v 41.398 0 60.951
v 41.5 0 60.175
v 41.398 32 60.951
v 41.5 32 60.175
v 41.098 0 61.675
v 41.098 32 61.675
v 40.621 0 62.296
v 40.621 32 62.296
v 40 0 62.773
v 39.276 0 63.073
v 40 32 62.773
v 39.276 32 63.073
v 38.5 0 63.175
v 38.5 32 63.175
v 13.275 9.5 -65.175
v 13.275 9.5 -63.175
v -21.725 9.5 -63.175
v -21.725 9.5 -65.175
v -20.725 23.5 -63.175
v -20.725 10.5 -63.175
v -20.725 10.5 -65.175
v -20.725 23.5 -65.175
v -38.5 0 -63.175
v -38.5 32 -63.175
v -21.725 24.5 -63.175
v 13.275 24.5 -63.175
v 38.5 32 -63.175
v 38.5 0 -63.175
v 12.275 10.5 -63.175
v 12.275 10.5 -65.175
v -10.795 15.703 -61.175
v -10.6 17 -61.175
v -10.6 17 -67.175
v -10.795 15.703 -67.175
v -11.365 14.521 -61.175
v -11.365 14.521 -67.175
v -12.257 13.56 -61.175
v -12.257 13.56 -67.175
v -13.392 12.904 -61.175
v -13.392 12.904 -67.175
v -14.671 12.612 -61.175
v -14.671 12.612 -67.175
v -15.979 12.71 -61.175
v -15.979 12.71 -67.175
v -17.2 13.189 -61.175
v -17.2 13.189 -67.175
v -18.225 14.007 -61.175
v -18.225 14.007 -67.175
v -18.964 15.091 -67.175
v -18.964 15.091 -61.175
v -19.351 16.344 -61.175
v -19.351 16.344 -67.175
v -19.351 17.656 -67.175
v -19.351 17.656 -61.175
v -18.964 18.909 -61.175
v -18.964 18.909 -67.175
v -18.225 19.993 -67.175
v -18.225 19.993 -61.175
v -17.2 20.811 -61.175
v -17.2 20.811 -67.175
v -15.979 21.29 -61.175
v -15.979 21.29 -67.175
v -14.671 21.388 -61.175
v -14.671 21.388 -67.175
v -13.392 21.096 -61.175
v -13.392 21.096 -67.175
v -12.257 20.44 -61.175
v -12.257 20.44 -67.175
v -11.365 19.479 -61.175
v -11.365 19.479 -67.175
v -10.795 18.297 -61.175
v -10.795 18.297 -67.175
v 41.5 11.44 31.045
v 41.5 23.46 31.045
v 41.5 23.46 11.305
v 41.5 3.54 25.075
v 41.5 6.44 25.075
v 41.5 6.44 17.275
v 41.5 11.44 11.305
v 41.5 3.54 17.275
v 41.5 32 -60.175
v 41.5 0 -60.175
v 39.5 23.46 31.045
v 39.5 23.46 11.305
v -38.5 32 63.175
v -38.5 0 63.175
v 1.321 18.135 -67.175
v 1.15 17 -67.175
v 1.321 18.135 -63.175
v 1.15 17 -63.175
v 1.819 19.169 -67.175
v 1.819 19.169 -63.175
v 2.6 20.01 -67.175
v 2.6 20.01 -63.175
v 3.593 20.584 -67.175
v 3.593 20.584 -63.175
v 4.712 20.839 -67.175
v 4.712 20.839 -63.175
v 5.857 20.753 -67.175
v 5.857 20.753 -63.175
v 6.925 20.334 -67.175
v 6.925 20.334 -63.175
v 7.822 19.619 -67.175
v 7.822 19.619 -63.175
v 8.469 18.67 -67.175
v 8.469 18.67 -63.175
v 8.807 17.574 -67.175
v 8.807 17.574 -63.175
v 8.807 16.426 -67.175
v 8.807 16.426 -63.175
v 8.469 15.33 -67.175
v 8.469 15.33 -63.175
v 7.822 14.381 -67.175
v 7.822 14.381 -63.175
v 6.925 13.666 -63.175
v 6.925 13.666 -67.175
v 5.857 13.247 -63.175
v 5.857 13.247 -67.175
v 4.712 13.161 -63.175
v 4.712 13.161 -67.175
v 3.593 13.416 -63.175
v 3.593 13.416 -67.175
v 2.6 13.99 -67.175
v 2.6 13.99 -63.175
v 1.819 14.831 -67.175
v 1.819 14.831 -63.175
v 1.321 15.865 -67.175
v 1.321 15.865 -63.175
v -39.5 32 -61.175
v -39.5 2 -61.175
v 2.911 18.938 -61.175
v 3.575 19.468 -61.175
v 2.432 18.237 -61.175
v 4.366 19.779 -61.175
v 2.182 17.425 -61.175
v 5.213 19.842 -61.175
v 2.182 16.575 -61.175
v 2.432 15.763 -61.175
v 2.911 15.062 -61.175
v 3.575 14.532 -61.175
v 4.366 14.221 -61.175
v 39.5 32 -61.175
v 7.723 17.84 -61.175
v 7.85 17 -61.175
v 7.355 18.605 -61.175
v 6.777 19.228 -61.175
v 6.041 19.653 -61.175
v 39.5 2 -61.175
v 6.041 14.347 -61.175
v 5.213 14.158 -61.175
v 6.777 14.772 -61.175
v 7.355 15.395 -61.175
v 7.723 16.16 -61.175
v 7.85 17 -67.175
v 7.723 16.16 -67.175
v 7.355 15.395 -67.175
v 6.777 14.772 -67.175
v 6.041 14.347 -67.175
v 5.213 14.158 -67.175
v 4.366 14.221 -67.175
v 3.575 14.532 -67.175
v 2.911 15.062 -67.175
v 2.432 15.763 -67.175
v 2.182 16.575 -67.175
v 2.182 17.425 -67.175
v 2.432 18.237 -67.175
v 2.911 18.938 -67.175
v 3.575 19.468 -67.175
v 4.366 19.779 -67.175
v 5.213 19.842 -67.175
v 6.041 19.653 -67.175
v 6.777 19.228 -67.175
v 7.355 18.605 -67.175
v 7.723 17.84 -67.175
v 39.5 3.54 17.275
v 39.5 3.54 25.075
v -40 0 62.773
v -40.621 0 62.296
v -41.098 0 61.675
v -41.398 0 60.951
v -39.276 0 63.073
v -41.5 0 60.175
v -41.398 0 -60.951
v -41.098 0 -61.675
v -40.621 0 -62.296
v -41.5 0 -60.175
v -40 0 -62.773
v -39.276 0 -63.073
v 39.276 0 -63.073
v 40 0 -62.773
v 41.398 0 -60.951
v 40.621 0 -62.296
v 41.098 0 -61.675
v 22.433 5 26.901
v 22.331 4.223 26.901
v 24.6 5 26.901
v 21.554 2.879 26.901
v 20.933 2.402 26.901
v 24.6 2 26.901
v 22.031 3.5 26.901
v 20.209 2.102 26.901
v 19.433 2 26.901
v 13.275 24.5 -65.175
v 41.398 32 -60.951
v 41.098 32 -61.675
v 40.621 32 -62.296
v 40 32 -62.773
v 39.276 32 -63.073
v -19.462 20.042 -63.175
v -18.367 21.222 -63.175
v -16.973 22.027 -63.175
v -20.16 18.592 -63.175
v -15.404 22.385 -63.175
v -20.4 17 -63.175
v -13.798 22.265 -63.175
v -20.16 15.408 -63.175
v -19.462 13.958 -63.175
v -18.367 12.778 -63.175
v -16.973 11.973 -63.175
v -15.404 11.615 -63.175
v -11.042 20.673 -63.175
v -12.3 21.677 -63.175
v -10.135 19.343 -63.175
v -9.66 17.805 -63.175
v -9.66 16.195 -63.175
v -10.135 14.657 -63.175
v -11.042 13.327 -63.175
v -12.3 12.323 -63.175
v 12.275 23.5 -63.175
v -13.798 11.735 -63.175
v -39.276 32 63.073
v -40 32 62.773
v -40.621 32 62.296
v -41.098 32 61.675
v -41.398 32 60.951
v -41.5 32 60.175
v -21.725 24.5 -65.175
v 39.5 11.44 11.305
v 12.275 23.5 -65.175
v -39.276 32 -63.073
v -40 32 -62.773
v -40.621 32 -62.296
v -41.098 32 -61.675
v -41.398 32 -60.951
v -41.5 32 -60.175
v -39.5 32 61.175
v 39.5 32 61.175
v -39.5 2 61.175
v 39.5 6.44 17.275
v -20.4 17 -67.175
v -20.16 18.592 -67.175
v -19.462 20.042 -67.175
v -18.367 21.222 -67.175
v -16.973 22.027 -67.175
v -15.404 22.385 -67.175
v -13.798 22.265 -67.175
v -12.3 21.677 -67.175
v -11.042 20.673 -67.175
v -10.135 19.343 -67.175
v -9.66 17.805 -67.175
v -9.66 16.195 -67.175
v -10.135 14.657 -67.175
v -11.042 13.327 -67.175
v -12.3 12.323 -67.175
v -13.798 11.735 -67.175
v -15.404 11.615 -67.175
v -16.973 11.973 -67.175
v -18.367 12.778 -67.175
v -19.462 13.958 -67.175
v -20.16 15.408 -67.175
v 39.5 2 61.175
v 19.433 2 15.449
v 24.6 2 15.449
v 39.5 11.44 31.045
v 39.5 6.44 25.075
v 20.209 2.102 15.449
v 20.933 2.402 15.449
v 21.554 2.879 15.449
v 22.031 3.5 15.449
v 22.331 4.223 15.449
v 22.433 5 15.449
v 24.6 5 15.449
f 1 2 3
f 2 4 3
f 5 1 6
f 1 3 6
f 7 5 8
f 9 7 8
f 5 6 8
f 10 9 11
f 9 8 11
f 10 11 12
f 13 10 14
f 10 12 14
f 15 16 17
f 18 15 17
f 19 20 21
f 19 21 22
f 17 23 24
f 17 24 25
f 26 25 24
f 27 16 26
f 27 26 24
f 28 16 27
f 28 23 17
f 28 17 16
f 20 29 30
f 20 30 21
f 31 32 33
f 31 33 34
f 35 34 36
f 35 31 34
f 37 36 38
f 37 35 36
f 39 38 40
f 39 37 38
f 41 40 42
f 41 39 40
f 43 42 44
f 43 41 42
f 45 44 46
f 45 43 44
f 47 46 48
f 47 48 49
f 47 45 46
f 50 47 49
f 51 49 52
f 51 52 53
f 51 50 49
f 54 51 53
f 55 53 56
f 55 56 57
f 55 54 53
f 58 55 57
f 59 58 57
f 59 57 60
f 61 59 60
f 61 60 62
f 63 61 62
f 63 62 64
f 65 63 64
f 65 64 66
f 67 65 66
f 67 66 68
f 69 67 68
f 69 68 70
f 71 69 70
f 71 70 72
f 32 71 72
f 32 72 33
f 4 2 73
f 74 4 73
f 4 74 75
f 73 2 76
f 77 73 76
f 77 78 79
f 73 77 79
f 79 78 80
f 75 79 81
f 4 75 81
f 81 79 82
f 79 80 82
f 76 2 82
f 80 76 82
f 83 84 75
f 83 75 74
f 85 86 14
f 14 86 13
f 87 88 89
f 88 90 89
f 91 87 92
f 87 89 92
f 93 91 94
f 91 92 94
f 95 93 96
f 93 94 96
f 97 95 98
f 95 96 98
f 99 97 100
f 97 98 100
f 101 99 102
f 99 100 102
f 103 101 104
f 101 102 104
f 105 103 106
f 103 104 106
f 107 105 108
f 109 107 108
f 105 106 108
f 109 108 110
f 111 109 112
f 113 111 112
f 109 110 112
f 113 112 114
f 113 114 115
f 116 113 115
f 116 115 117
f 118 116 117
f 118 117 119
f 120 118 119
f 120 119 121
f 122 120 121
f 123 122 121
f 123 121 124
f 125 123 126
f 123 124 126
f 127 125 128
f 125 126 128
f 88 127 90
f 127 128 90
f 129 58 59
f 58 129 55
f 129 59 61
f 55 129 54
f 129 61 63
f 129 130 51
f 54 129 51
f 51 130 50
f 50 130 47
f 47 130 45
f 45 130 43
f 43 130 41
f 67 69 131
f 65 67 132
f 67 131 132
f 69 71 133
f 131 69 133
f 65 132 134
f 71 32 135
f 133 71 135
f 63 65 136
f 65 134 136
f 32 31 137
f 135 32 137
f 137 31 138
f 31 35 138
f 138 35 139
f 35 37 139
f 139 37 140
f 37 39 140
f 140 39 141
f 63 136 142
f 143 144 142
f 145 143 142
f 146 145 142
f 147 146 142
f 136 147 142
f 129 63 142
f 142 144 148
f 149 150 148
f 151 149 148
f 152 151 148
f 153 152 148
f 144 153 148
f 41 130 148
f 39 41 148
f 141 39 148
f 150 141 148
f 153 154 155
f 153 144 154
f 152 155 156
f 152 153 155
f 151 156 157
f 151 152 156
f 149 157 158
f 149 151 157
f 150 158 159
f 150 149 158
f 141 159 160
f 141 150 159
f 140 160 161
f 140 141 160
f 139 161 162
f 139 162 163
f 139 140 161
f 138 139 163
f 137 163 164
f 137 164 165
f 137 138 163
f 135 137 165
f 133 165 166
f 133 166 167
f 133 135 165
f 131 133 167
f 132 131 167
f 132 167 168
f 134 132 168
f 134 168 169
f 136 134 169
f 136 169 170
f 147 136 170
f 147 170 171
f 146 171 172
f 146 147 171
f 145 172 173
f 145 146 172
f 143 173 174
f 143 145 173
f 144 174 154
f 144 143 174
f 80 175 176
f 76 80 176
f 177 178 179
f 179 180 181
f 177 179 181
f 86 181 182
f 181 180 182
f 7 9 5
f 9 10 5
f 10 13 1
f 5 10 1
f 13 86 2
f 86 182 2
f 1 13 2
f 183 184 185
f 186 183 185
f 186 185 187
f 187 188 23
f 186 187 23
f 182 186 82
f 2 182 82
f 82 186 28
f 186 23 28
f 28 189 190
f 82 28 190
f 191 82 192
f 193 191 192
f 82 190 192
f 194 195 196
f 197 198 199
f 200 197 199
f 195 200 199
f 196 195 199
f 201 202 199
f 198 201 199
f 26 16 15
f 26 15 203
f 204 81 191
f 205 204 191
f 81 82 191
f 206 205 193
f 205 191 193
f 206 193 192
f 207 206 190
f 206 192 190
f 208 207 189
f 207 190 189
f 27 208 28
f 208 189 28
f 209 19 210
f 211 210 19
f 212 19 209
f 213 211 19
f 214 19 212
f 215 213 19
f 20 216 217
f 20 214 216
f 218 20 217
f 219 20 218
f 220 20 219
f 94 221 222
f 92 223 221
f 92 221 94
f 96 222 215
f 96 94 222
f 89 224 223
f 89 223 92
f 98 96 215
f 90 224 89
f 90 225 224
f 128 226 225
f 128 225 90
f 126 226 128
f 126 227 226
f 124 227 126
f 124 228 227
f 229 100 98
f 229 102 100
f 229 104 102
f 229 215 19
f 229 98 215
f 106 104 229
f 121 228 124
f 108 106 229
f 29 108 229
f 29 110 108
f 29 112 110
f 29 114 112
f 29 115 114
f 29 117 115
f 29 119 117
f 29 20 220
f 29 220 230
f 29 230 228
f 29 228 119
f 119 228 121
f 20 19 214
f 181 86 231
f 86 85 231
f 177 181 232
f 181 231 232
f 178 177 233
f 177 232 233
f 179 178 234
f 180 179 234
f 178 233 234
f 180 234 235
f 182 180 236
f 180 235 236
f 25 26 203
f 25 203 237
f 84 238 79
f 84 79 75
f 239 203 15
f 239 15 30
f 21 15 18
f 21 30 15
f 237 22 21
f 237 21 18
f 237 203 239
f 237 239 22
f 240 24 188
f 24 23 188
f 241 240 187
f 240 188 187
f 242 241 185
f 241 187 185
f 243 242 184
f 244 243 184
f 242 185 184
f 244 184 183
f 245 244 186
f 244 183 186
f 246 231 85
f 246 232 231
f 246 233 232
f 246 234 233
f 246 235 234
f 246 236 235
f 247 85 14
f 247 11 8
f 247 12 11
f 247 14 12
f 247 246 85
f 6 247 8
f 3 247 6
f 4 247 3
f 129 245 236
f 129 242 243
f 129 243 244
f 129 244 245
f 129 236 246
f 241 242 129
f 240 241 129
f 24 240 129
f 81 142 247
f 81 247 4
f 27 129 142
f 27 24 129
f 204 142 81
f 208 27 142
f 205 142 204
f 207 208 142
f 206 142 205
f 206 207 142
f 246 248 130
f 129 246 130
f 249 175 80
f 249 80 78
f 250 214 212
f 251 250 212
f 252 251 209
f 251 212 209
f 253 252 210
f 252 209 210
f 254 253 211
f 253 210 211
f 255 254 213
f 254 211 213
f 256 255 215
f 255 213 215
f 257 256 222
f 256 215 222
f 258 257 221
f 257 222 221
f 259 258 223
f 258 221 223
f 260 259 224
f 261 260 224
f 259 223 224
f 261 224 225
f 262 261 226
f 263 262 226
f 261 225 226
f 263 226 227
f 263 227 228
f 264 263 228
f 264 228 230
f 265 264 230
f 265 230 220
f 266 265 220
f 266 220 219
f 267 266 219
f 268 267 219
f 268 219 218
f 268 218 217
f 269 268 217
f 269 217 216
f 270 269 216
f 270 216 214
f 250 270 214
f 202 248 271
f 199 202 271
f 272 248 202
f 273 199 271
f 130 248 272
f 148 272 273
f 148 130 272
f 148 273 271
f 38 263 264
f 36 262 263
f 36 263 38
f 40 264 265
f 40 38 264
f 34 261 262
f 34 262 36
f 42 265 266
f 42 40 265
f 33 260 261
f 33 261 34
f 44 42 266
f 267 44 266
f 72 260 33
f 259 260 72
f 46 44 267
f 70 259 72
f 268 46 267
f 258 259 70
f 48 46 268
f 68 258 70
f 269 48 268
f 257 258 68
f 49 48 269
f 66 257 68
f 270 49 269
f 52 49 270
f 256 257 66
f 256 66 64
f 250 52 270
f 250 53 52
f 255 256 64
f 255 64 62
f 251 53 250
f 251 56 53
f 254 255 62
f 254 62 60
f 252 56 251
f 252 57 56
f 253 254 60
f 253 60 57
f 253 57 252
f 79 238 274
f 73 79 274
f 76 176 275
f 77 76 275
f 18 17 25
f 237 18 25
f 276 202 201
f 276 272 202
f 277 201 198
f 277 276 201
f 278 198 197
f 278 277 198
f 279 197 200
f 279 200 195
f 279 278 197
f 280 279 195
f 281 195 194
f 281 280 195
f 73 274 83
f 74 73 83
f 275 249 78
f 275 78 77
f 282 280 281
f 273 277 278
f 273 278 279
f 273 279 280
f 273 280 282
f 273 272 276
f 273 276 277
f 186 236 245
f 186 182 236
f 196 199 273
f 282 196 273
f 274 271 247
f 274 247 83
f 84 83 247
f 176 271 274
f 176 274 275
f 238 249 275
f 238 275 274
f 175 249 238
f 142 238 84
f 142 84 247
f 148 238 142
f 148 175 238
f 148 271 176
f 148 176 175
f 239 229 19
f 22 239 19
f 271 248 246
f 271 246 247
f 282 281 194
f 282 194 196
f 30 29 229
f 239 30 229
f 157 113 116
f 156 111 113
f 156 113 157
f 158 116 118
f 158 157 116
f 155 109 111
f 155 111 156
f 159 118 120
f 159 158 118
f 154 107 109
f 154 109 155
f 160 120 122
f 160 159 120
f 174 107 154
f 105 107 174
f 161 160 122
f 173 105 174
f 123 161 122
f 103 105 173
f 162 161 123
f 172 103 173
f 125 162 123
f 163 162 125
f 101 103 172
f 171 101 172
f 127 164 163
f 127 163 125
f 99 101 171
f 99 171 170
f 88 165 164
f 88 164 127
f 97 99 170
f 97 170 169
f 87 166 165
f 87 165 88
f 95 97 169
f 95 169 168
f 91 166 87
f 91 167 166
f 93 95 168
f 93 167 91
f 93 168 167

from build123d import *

# Parameters (mm, degrees)
SKETCH1_W           = 83
SKETCH1_H           = 126.35
BOSS_EXTRUDE1_DEPTH = 2
SKETCH2_W           = 83
SKETCH2_H           = 126.35
SKETCH2_W_2         = 79
SKETCH2_H_2         = 122.35
BOSS_EXTRUDE2_DEPTH = 30
SKETCH3_W           = 7.8
SKETCH3_H           = 2.9
SKETCH3_W_2         = 19.74
SKETCH3_H_2         = 12.02
CUT_EXTRUDE1_DEPTH  = 108.59219593
SKETCH4_W           = 2.167162511
SKETCH4_H           = 11.452793886
BOSS_EXTRUDE3_DEPTH = 3
FILLET2_R           = 3
FILLET1_R           = 3
SKETCH6_R           = 4.4
SKETCH6_R_2         = 2.85
CUT_EXTRUDE2_DEPTH  = 135.941366897
SKETCH7_W           = 35
SKETCH7_H           = 15
SKETCH7_W_2         = 33
SKETCH7_H_2         = 13
SKETCH7_R           = 5.4
SKETCH7_R_2         = 4.4
SKETCH7_R_3         = 3.85
SKETCH7_R_4         = 2.85
BOSS_EXTRUDE4_DEPTH = 2
SKETCH8_R           = 3.85
SKETCH8_R_2         = 2.85
SKETCH8_R_3         = 5.4
SKETCH8_R_4         = 4.4
BOSS_EXTRUDE5_DEPTH = 2


with BuildPart() as part:
    # Sketch1 → Boss-Extrude1 (new body)
    with BuildSketch(Plane(origin=(0, 0, 0), x_dir=(1, 0, 0), z_dir=(0, 1, 0))):
        Rectangle(SKETCH1_W, SKETCH1_H)
    extrude(amount=BOSS_EXTRUDE1_DEPTH)

    # Sketch2 → Boss-Extrude2 (add)
    with BuildSketch(Plane(origin=(0, 2, 0), x_dir=(1, 0, 0), z_dir=(0, 1, 0))):
        Rectangle(SKETCH2_W, SKETCH2_H)
        Rectangle(SKETCH2_W_2, SKETCH2_H_2, mode=Mode.SUBTRACT)
    extrude(amount=BOSS_EXTRUDE2_DEPTH)

    # Sketch3 → Cut-Extrude1 (cut, through all)
    with BuildSketch(Plane.ZY.offset(-39.5)):
        with Locations((21.175, 4.99)):
            Rectangle(SKETCH3_W, SKETCH3_H)
        with Locations((21.175, 17.45)):
            Rectangle(SKETCH3_W_2, SKETCH3_H_2)
    extrude(amount=-CUT_EXTRUDE1_DEPTH, mode=Mode.SUBTRACT)

    # Sketch4 → Boss-Extrude3 (add)
    with BuildSketch(Plane(origin=(0, 2, 0), x_dir=(1, 0, 0), z_dir=(0, 1, 0))):
        with Locations((23.516418745, -21.175)):
            Rectangle(SKETCH4_W, SKETCH4_H)
    extrude(amount=BOSS_EXTRUDE3_DEPTH)

    # Fillet2
    fillet2_edges = [part.edges().sort_by_distance(p)[0] for p in [
        (22.432837489, 2, 21.175),
    ]]
    fillet(fillet2_edges, radius=FILLET2_R - 0.0001)  # a hair under: the kernel refuses the full size

    # Fillet1
    fillet1_edges = [part.edges().sort_by_distance(p)[0] for p in [
        (-41.5, 16, -63.175),
        (-41.5, 16, 63.175),
        (41.5, 16, 63.175),
        (41.5, 16, -63.175),
    ]]
    fillet(fillet1_edges, radius=FILLET1_R)

    # Sketch6 → Cut-Extrude2 (cut, through all)
    with BuildSketch(Plane.XY.offset(-61.175)):
        with Locations((-15, 17)):
            Circle(SKETCH6_R)
        with Locations((5, 17)):
            Circle(SKETCH6_R_2)
    extrude(amount=-CUT_EXTRUDE2_DEPTH, mode=Mode.SUBTRACT)

    # Sketch7 → Boss-Extrude4 (add)
    # profile 1 of 3: a face of its own
    with BuildSketch(Plane(origin=(0, 0, -63.175), x_dir=(-1, 0, 0), z_dir=(0, 0, -1))):
        with Locations((4.225, 17)):
            Rectangle(SKETCH7_W, SKETCH7_H)
        with Locations((4.225, 17)):
            Rectangle(SKETCH7_W_2, SKETCH7_H_2, mode=Mode.SUBTRACT)
    # profile 2 of 3: a face of its own
    with BuildSketch(Plane(origin=(0, 0, -63.175), x_dir=(-1, 0, 0), z_dir=(0, 0, -1))):
        with Locations((15, 17)):
            Circle(SKETCH7_R)
        with Locations(Location((15, 17, 0), (0, 0, 180))):
            Circle(SKETCH7_R_2, mode=Mode.SUBTRACT)
    # profile 3 of 3: a face of its own
    with BuildSketch(Plane(origin=(0, 0, -63.175), x_dir=(-1, 0, 0), z_dir=(0, 0, -1))):
        with Locations((-5, 17)):
            Circle(SKETCH7_R_3)
        with Locations(Location((-5, 17, 0), (0, 0, 180))):
            Circle(SKETCH7_R_4, mode=Mode.SUBTRACT)
    extrude(amount=BOSS_EXTRUDE4_DEPTH)

    # Sketch8 → Boss-Extrude5 (add)
    # profile 1 of 2: a face of its own
    with BuildSketch(Plane(origin=(0, 0, -65.175), x_dir=(-1, 0, 0), z_dir=(0, 0, -1))):
        with Locations((-5, 17)):
            Circle(SKETCH8_R)
        with Locations(Location((-5, 17, 0), (0, 0, 180))):
            Circle(SKETCH8_R_2, mode=Mode.SUBTRACT)
    # profile 2 of 2: a face of its own
    with BuildSketch(Plane(origin=(0, 0, -65.175), x_dir=(-1, 0, 0), z_dir=(0, 0, -1))):
        with Locations((15, 17)):
            Circle(SKETCH8_R_3)
        with Locations(Location((15, 17, 0), (0, 0, 180))):
            Circle(SKETCH8_R_4, mode=Mode.SUBTRACT)
    extrude(amount=BOSS_EXTRUDE5_DEPTH)


solid = part.part
